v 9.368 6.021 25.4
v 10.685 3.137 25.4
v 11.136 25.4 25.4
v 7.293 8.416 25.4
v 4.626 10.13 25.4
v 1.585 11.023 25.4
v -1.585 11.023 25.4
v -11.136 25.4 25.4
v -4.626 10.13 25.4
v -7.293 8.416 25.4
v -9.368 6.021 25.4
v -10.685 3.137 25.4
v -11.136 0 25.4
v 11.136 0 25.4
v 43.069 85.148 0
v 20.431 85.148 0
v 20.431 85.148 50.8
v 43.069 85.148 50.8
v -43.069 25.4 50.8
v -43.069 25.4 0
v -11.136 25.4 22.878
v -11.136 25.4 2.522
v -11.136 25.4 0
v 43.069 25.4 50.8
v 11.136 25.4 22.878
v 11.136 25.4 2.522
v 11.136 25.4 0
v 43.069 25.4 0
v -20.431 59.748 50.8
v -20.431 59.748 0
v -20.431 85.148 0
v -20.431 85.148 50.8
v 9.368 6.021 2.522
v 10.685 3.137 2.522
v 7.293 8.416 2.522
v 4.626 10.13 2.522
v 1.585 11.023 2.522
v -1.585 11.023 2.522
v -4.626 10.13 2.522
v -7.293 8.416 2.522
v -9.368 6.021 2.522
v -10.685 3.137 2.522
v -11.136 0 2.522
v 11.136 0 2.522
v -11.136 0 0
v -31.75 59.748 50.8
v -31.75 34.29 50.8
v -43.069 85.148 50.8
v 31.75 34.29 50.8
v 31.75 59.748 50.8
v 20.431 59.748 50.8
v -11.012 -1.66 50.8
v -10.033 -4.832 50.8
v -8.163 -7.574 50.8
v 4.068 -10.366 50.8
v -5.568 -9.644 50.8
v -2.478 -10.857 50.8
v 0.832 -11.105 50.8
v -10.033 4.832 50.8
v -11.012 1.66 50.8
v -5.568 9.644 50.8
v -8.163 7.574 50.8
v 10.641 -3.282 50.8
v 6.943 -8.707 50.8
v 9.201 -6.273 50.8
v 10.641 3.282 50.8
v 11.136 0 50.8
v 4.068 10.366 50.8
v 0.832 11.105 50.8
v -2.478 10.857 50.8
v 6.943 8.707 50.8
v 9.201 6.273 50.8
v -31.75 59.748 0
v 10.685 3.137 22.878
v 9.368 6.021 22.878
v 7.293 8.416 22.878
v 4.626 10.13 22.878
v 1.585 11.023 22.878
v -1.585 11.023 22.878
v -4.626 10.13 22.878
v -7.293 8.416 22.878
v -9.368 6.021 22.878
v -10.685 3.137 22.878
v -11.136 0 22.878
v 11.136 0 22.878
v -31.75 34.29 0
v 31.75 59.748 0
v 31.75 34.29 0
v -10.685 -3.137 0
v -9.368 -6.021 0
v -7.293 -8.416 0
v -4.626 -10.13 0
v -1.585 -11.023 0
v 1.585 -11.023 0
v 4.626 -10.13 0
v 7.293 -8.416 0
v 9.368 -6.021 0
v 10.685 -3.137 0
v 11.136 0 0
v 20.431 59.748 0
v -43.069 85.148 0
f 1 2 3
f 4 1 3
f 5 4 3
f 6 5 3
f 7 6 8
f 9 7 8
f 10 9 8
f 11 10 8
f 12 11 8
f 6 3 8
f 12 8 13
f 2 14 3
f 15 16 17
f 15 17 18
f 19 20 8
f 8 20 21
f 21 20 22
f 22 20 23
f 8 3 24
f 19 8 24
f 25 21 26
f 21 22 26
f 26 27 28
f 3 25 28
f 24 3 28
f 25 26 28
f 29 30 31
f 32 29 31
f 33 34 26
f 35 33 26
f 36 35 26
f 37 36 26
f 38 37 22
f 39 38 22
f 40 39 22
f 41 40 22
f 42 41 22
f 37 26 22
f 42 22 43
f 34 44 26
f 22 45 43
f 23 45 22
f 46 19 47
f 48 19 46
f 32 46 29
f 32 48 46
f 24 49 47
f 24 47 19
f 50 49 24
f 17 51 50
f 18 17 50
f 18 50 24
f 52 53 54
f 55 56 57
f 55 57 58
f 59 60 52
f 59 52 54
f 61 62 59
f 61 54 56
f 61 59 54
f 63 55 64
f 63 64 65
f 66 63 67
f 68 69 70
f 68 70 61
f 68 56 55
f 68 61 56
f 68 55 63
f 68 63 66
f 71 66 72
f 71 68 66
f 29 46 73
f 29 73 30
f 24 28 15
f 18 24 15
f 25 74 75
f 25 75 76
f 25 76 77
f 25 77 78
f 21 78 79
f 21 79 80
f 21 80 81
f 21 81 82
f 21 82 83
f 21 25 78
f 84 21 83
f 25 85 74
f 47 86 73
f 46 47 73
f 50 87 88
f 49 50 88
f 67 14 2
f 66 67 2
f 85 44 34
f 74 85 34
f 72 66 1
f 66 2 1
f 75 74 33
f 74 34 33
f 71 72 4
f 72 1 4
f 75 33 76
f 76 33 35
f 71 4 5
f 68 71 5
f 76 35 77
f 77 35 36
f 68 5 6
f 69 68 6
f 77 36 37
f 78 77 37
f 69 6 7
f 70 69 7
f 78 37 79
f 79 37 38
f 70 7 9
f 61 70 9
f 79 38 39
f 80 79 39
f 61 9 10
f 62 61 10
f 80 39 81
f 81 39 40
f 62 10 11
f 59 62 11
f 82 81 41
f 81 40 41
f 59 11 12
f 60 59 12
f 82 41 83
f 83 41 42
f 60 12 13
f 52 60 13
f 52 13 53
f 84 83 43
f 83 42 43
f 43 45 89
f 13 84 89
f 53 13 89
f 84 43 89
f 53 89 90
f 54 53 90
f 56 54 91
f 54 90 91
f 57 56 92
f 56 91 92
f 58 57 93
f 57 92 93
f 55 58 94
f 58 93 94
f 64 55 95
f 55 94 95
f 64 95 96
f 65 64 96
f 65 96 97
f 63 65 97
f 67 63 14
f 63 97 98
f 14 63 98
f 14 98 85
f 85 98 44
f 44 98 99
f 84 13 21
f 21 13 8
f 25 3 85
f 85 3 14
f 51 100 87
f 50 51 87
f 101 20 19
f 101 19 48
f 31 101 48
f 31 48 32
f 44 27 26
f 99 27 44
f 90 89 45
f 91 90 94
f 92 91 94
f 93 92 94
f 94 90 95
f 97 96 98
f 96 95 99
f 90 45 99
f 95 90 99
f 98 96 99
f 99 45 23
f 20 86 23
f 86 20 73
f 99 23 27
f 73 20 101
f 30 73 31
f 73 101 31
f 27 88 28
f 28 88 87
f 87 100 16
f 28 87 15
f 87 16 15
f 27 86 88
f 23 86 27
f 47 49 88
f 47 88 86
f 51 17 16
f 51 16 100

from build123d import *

# Parameters (mm, degrees)
BOSS_EXTRUDE1_DEPTH = 2.521826736
SKETCH2_R           = 11.136118556
BOSS_EXTRUDE2_DEPTH = 50.8
SKETCH3_W           = 86.137031446
SKETCH3_H           = 59.748072355
BOSS_EXTRUDE3_DEPTH = 50.8
CUT_EXTRUDE1_DEPTH  = 109.100560925


with BuildPart() as part:
    # Sketch1 → Boss-Extrude1 (new body)
    with BuildSketch(Plane.XY):
        with BuildLine():
            Line((-11.136118556, 0), (-11.136118556, 25.4))
            Line((-11.136118556, 25.4), (11.136118556, 25.4))
            Line((11.136118556, 25.4), (11.136118556, 0))
            ThreePointArc((11.136118556, 0), (0, 11.136118556), (-11.136118556, 0))
        make_face()
    boss_extrude1 = extrude(amount=BOSS_EXTRUDE1_DEPTH)

    # Sketch2 → Boss-Extrude2 (add)
    with BuildSketch(Plane.XY):
        Circle(SKETCH2_R)
    extrude(amount=BOSS_EXTRUDE2_DEPTH)

    # Sketch3 → Boss-Extrude3 (add)
    with BuildSketch(Plane.XY):
        with Locations((0, 55.274036178)):
            Rectangle(SKETCH3_W, SKETCH3_H)
    extrude(amount=BOSS_EXTRUDE3_DEPTH)

    # Sketch4 → Cut-Extrude1 (cut, through all)
    with BuildSketch(Plane.XY.offset(50.8)):
        Polygon((20.431484277, 85.148072355), (20.431484277, 59.748072355), (31.75, 59.748072355), (31.75, 34.29), (-31.75, 34.29), (-31.75, 59.748072355), (-20.431484277, 59.748072355), (-20.431484277, 85.148072355), align=None)
    extrude(amount=-CUT_EXTRUDE1_DEPTH, mode=Mode.SUBTRACT)

    # Mirror1: Boss-Extrude1 across plane
    add(boss_extrude1.mirror(Plane(origin=(0, 0, 12.7), x_dir=(1, 0, 0), z_dir=(0, 0, -1))))


solid = part.part
